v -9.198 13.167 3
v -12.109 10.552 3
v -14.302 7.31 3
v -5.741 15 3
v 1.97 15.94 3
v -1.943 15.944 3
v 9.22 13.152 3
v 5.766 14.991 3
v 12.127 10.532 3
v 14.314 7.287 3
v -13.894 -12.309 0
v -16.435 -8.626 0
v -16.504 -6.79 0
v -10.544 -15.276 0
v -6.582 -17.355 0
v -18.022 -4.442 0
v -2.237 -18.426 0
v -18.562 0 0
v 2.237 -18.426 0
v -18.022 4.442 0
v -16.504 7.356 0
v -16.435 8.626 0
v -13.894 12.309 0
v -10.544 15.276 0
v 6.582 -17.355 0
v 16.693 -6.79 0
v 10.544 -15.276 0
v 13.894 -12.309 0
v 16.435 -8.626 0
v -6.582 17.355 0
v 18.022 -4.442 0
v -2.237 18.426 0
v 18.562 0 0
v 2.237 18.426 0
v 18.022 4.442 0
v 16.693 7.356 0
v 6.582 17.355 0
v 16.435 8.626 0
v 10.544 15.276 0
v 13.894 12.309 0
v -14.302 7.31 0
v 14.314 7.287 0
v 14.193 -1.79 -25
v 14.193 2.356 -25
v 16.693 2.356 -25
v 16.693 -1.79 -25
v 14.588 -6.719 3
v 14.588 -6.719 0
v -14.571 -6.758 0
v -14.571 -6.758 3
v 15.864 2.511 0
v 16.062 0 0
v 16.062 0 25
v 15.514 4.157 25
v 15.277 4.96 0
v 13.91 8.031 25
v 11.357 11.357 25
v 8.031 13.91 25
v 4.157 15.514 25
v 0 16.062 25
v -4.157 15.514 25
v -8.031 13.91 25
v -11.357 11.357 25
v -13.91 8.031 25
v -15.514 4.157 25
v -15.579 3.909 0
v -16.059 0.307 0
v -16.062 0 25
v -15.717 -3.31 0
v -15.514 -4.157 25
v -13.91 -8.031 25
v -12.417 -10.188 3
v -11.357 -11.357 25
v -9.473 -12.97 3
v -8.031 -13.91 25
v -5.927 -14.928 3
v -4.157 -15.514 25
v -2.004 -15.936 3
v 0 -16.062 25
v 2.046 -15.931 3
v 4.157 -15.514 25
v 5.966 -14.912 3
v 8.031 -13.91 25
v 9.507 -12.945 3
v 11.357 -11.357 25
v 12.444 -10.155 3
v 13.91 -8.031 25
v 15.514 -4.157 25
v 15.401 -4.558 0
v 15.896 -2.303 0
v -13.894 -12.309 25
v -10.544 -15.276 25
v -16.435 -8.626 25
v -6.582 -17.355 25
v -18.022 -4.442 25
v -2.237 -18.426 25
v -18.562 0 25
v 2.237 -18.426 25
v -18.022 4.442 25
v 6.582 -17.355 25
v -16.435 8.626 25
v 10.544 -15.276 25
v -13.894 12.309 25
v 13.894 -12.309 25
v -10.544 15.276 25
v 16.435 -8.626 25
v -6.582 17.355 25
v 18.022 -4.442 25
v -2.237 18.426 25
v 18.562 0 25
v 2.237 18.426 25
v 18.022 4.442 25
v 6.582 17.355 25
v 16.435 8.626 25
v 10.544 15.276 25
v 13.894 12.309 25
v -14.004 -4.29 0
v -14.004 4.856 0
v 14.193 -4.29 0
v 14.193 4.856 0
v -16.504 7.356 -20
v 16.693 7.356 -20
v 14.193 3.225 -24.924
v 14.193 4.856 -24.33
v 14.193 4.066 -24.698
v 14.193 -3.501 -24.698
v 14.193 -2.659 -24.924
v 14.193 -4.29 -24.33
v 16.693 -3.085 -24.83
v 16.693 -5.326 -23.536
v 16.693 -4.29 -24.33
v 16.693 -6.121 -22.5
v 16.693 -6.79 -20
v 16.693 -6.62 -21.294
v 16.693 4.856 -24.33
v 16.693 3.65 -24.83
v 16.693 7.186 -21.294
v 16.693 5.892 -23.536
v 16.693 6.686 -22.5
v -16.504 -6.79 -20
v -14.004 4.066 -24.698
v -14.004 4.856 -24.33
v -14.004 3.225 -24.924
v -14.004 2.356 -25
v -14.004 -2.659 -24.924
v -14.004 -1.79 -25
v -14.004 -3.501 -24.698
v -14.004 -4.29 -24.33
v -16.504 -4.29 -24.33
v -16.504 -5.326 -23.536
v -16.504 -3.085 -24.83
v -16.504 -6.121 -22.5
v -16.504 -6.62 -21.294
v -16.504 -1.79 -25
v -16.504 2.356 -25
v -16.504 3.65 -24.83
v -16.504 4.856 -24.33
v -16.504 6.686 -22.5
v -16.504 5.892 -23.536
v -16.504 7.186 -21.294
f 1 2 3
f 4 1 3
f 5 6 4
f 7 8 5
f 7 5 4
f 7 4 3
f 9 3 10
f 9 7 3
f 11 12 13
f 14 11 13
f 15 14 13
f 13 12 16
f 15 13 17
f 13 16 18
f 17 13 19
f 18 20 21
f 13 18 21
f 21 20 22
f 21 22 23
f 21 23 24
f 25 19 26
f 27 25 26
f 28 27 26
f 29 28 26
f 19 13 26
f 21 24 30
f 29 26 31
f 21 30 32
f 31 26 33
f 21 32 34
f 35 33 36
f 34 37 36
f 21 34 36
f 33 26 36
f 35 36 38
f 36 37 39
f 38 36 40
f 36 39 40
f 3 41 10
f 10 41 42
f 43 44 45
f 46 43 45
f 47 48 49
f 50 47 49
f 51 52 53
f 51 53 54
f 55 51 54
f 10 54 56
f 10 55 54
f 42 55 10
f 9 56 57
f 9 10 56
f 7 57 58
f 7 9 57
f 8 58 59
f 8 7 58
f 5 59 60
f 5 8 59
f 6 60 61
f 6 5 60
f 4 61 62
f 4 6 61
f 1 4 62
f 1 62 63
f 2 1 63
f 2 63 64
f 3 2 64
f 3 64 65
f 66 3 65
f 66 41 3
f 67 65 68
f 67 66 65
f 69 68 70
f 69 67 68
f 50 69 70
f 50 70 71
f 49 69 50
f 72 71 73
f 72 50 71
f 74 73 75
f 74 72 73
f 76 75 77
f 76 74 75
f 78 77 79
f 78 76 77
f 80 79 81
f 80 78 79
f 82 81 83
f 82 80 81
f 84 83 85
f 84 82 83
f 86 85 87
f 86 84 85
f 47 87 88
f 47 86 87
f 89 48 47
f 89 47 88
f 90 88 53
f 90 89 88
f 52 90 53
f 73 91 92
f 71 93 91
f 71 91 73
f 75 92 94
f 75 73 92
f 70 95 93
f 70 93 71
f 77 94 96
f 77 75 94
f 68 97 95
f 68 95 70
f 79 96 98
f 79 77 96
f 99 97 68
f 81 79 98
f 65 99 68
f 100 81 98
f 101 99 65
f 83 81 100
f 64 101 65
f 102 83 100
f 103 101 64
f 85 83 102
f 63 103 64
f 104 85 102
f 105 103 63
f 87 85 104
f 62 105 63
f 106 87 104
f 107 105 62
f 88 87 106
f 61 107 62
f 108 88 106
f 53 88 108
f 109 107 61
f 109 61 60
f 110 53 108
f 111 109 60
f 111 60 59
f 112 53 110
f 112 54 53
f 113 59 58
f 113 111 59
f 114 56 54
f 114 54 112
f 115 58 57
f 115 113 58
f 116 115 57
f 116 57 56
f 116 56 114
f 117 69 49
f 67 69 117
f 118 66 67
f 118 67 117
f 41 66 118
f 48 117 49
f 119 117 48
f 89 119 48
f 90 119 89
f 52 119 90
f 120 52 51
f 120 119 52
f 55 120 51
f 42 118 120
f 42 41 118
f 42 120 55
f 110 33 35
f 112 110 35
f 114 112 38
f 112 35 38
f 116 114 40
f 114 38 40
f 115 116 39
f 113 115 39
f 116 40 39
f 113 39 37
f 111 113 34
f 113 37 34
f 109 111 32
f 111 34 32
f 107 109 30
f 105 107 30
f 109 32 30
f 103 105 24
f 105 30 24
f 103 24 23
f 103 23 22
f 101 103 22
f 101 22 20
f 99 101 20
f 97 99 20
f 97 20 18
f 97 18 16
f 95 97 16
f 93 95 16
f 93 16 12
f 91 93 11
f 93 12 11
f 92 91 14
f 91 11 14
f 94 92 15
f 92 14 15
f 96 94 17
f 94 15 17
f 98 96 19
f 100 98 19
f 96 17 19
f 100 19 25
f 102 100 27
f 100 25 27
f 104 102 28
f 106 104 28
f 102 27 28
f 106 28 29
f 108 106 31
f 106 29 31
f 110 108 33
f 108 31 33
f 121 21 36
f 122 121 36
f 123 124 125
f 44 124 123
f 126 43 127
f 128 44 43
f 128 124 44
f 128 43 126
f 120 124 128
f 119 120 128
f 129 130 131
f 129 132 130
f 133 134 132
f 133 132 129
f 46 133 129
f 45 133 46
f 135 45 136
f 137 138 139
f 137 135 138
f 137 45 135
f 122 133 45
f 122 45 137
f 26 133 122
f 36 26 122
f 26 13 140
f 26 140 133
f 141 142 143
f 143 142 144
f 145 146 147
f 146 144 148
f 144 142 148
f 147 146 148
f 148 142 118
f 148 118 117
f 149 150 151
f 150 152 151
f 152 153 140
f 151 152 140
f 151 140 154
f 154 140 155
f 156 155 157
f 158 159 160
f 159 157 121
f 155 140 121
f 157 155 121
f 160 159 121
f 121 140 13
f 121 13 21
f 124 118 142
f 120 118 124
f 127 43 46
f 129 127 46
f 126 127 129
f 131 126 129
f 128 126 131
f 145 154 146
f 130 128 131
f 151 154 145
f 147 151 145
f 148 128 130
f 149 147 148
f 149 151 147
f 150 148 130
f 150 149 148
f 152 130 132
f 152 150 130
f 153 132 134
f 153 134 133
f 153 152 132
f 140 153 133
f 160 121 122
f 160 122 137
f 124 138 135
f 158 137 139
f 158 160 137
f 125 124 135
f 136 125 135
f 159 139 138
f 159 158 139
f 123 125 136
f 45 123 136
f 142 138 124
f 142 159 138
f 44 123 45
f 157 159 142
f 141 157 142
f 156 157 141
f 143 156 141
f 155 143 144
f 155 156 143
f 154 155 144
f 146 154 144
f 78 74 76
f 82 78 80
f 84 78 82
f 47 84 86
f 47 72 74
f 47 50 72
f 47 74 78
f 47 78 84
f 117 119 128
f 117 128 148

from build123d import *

# Parameters (mm, degrees)
F0_R         = 18.561525572
F1_DEPTH     = 25
F2_T         = -2.5
F3_W         = 33.1976041198
F3_H         = 14.1467070207
F4_DEPTH     = 25
F5_T         = -2.5
F7_DEPTH     = 3
F9_DEPTH     = 3
F10_T1_DEPTH = 58.1976041198
F11_T1_DEPTH = 58.1976041198


# Not quite as in the source:
# - a fillet or chamfer that OpenCascade refuses, or shapes differently, is made with other operations: its cross-section is extruded or revolved along the edge and cut away or added
# - a shell that OpenCascade refuses in one call is made with other operations: the cavity is built on its own and cut out


with BuildPart() as f1:
    # F0 (on Top) → F1 (new body)
    with BuildSketch(Plane.XY):
        Circle(F0_R)
    extrude(amount=F1_DEPTH)

    # F2
    f2_openings = [f1.faces().sort_by_distance(p)[0] for p in [
        (0, 0, 25),
        (0, 0, 0),
    ]]
    offset(amount=F2_T, openings=f2_openings)

    # F3 (on Top) → F4 (join)
    with BuildSketch(Plane.XY):
        with Locations((0.0943113118, 0.2829344012)):
            Rectangle(F3_W, F3_H)
    extrude(amount=-F4_DEPTH)

    # F5: a shell. OpenCascade refuses it in one call, so the cavity is built on its own and cut out:
    # the body offset inwards by the wall thickness, plus a prism from it out through each open face.
    f5_core = offset(f1.part, amount=F5_T, mode=Mode.PRIVATE)
    f5_exits = [f5_core.faces().sort_by_distance(p)[0] for p in [
        (0.094311, 0.282934, -22.5),
        (0.094311, 0.282934, -2.5),
    ]]
    add(f5_core, mode=Mode.SUBTRACT)
    extrude(f5_exits, amount=-F5_T, mode=Mode.SUBTRACT)

    # F6 (on Top) → F7 (join)
    with BuildSketch(Plane.XY):
        with BuildLine():
            Line((16.6573040187, -6.7166290246), (-16.5601819754, -6.760219112))
            ThreePointArc((-16.5601819754, -6.760219112), (0.0631717454, -17.8724120589), (16.6573040187, -6.7166290246))
        make_face()
    extrude(amount=F7_DEPTH)

    # F8 (on Top) → F9 (join)
    with BuildSketch(Plane.XY):
        with BuildLine():
            Line((-16.4011158049, 7.3119108565), (16.5623016655, 7.2848270647))
            ThreePointArc((16.5623016655, 7.2848270647), (0.0891507264, 17.7139786602), (-16.4011158049, 7.3119108565))
        make_face()
    extrude(amount=F9_DEPTH)

    # F10: fillet of radius 5 on 1 edges, made by hand

    # F10_s2 → F10_t1 (cut)
    with BuildSketch(Plane.YZ.offset(-29.004490748)):
        with BuildLine():
            ThreePointArc((-1.7904191092, -25), (-5.3259530151, -23.5355339059), (-6.7904191092, -20))
            Line((-6.7904191092, -20), (-6.7904191092, -25))
            Line((-6.7904191092, -25), (-1.7904191092, -25))
        make_face()
    extrude(amount=F10_T1_DEPTH, mode=Mode.SUBTRACT)

    # F11: fillet of radius 5 on 1 edges, made by hand

    # F11_s2 → F11_t1 (cut)
    with BuildSketch(Plane.YZ.offset(-29.004490748)):
        with BuildLine():
            ThreePointArc((7.3562879115, -20), (5.8918218175, -23.5355339059), (2.3562879115, -25))
            Line((2.3562879115, -25), (7.3562879115, -25))
            Line((7.3562879115, -25), (7.3562879115, -20))
        make_face()
    extrude(amount=F11_T1_DEPTH, mode=Mode.SUBTRACT)


solid = f1.part
